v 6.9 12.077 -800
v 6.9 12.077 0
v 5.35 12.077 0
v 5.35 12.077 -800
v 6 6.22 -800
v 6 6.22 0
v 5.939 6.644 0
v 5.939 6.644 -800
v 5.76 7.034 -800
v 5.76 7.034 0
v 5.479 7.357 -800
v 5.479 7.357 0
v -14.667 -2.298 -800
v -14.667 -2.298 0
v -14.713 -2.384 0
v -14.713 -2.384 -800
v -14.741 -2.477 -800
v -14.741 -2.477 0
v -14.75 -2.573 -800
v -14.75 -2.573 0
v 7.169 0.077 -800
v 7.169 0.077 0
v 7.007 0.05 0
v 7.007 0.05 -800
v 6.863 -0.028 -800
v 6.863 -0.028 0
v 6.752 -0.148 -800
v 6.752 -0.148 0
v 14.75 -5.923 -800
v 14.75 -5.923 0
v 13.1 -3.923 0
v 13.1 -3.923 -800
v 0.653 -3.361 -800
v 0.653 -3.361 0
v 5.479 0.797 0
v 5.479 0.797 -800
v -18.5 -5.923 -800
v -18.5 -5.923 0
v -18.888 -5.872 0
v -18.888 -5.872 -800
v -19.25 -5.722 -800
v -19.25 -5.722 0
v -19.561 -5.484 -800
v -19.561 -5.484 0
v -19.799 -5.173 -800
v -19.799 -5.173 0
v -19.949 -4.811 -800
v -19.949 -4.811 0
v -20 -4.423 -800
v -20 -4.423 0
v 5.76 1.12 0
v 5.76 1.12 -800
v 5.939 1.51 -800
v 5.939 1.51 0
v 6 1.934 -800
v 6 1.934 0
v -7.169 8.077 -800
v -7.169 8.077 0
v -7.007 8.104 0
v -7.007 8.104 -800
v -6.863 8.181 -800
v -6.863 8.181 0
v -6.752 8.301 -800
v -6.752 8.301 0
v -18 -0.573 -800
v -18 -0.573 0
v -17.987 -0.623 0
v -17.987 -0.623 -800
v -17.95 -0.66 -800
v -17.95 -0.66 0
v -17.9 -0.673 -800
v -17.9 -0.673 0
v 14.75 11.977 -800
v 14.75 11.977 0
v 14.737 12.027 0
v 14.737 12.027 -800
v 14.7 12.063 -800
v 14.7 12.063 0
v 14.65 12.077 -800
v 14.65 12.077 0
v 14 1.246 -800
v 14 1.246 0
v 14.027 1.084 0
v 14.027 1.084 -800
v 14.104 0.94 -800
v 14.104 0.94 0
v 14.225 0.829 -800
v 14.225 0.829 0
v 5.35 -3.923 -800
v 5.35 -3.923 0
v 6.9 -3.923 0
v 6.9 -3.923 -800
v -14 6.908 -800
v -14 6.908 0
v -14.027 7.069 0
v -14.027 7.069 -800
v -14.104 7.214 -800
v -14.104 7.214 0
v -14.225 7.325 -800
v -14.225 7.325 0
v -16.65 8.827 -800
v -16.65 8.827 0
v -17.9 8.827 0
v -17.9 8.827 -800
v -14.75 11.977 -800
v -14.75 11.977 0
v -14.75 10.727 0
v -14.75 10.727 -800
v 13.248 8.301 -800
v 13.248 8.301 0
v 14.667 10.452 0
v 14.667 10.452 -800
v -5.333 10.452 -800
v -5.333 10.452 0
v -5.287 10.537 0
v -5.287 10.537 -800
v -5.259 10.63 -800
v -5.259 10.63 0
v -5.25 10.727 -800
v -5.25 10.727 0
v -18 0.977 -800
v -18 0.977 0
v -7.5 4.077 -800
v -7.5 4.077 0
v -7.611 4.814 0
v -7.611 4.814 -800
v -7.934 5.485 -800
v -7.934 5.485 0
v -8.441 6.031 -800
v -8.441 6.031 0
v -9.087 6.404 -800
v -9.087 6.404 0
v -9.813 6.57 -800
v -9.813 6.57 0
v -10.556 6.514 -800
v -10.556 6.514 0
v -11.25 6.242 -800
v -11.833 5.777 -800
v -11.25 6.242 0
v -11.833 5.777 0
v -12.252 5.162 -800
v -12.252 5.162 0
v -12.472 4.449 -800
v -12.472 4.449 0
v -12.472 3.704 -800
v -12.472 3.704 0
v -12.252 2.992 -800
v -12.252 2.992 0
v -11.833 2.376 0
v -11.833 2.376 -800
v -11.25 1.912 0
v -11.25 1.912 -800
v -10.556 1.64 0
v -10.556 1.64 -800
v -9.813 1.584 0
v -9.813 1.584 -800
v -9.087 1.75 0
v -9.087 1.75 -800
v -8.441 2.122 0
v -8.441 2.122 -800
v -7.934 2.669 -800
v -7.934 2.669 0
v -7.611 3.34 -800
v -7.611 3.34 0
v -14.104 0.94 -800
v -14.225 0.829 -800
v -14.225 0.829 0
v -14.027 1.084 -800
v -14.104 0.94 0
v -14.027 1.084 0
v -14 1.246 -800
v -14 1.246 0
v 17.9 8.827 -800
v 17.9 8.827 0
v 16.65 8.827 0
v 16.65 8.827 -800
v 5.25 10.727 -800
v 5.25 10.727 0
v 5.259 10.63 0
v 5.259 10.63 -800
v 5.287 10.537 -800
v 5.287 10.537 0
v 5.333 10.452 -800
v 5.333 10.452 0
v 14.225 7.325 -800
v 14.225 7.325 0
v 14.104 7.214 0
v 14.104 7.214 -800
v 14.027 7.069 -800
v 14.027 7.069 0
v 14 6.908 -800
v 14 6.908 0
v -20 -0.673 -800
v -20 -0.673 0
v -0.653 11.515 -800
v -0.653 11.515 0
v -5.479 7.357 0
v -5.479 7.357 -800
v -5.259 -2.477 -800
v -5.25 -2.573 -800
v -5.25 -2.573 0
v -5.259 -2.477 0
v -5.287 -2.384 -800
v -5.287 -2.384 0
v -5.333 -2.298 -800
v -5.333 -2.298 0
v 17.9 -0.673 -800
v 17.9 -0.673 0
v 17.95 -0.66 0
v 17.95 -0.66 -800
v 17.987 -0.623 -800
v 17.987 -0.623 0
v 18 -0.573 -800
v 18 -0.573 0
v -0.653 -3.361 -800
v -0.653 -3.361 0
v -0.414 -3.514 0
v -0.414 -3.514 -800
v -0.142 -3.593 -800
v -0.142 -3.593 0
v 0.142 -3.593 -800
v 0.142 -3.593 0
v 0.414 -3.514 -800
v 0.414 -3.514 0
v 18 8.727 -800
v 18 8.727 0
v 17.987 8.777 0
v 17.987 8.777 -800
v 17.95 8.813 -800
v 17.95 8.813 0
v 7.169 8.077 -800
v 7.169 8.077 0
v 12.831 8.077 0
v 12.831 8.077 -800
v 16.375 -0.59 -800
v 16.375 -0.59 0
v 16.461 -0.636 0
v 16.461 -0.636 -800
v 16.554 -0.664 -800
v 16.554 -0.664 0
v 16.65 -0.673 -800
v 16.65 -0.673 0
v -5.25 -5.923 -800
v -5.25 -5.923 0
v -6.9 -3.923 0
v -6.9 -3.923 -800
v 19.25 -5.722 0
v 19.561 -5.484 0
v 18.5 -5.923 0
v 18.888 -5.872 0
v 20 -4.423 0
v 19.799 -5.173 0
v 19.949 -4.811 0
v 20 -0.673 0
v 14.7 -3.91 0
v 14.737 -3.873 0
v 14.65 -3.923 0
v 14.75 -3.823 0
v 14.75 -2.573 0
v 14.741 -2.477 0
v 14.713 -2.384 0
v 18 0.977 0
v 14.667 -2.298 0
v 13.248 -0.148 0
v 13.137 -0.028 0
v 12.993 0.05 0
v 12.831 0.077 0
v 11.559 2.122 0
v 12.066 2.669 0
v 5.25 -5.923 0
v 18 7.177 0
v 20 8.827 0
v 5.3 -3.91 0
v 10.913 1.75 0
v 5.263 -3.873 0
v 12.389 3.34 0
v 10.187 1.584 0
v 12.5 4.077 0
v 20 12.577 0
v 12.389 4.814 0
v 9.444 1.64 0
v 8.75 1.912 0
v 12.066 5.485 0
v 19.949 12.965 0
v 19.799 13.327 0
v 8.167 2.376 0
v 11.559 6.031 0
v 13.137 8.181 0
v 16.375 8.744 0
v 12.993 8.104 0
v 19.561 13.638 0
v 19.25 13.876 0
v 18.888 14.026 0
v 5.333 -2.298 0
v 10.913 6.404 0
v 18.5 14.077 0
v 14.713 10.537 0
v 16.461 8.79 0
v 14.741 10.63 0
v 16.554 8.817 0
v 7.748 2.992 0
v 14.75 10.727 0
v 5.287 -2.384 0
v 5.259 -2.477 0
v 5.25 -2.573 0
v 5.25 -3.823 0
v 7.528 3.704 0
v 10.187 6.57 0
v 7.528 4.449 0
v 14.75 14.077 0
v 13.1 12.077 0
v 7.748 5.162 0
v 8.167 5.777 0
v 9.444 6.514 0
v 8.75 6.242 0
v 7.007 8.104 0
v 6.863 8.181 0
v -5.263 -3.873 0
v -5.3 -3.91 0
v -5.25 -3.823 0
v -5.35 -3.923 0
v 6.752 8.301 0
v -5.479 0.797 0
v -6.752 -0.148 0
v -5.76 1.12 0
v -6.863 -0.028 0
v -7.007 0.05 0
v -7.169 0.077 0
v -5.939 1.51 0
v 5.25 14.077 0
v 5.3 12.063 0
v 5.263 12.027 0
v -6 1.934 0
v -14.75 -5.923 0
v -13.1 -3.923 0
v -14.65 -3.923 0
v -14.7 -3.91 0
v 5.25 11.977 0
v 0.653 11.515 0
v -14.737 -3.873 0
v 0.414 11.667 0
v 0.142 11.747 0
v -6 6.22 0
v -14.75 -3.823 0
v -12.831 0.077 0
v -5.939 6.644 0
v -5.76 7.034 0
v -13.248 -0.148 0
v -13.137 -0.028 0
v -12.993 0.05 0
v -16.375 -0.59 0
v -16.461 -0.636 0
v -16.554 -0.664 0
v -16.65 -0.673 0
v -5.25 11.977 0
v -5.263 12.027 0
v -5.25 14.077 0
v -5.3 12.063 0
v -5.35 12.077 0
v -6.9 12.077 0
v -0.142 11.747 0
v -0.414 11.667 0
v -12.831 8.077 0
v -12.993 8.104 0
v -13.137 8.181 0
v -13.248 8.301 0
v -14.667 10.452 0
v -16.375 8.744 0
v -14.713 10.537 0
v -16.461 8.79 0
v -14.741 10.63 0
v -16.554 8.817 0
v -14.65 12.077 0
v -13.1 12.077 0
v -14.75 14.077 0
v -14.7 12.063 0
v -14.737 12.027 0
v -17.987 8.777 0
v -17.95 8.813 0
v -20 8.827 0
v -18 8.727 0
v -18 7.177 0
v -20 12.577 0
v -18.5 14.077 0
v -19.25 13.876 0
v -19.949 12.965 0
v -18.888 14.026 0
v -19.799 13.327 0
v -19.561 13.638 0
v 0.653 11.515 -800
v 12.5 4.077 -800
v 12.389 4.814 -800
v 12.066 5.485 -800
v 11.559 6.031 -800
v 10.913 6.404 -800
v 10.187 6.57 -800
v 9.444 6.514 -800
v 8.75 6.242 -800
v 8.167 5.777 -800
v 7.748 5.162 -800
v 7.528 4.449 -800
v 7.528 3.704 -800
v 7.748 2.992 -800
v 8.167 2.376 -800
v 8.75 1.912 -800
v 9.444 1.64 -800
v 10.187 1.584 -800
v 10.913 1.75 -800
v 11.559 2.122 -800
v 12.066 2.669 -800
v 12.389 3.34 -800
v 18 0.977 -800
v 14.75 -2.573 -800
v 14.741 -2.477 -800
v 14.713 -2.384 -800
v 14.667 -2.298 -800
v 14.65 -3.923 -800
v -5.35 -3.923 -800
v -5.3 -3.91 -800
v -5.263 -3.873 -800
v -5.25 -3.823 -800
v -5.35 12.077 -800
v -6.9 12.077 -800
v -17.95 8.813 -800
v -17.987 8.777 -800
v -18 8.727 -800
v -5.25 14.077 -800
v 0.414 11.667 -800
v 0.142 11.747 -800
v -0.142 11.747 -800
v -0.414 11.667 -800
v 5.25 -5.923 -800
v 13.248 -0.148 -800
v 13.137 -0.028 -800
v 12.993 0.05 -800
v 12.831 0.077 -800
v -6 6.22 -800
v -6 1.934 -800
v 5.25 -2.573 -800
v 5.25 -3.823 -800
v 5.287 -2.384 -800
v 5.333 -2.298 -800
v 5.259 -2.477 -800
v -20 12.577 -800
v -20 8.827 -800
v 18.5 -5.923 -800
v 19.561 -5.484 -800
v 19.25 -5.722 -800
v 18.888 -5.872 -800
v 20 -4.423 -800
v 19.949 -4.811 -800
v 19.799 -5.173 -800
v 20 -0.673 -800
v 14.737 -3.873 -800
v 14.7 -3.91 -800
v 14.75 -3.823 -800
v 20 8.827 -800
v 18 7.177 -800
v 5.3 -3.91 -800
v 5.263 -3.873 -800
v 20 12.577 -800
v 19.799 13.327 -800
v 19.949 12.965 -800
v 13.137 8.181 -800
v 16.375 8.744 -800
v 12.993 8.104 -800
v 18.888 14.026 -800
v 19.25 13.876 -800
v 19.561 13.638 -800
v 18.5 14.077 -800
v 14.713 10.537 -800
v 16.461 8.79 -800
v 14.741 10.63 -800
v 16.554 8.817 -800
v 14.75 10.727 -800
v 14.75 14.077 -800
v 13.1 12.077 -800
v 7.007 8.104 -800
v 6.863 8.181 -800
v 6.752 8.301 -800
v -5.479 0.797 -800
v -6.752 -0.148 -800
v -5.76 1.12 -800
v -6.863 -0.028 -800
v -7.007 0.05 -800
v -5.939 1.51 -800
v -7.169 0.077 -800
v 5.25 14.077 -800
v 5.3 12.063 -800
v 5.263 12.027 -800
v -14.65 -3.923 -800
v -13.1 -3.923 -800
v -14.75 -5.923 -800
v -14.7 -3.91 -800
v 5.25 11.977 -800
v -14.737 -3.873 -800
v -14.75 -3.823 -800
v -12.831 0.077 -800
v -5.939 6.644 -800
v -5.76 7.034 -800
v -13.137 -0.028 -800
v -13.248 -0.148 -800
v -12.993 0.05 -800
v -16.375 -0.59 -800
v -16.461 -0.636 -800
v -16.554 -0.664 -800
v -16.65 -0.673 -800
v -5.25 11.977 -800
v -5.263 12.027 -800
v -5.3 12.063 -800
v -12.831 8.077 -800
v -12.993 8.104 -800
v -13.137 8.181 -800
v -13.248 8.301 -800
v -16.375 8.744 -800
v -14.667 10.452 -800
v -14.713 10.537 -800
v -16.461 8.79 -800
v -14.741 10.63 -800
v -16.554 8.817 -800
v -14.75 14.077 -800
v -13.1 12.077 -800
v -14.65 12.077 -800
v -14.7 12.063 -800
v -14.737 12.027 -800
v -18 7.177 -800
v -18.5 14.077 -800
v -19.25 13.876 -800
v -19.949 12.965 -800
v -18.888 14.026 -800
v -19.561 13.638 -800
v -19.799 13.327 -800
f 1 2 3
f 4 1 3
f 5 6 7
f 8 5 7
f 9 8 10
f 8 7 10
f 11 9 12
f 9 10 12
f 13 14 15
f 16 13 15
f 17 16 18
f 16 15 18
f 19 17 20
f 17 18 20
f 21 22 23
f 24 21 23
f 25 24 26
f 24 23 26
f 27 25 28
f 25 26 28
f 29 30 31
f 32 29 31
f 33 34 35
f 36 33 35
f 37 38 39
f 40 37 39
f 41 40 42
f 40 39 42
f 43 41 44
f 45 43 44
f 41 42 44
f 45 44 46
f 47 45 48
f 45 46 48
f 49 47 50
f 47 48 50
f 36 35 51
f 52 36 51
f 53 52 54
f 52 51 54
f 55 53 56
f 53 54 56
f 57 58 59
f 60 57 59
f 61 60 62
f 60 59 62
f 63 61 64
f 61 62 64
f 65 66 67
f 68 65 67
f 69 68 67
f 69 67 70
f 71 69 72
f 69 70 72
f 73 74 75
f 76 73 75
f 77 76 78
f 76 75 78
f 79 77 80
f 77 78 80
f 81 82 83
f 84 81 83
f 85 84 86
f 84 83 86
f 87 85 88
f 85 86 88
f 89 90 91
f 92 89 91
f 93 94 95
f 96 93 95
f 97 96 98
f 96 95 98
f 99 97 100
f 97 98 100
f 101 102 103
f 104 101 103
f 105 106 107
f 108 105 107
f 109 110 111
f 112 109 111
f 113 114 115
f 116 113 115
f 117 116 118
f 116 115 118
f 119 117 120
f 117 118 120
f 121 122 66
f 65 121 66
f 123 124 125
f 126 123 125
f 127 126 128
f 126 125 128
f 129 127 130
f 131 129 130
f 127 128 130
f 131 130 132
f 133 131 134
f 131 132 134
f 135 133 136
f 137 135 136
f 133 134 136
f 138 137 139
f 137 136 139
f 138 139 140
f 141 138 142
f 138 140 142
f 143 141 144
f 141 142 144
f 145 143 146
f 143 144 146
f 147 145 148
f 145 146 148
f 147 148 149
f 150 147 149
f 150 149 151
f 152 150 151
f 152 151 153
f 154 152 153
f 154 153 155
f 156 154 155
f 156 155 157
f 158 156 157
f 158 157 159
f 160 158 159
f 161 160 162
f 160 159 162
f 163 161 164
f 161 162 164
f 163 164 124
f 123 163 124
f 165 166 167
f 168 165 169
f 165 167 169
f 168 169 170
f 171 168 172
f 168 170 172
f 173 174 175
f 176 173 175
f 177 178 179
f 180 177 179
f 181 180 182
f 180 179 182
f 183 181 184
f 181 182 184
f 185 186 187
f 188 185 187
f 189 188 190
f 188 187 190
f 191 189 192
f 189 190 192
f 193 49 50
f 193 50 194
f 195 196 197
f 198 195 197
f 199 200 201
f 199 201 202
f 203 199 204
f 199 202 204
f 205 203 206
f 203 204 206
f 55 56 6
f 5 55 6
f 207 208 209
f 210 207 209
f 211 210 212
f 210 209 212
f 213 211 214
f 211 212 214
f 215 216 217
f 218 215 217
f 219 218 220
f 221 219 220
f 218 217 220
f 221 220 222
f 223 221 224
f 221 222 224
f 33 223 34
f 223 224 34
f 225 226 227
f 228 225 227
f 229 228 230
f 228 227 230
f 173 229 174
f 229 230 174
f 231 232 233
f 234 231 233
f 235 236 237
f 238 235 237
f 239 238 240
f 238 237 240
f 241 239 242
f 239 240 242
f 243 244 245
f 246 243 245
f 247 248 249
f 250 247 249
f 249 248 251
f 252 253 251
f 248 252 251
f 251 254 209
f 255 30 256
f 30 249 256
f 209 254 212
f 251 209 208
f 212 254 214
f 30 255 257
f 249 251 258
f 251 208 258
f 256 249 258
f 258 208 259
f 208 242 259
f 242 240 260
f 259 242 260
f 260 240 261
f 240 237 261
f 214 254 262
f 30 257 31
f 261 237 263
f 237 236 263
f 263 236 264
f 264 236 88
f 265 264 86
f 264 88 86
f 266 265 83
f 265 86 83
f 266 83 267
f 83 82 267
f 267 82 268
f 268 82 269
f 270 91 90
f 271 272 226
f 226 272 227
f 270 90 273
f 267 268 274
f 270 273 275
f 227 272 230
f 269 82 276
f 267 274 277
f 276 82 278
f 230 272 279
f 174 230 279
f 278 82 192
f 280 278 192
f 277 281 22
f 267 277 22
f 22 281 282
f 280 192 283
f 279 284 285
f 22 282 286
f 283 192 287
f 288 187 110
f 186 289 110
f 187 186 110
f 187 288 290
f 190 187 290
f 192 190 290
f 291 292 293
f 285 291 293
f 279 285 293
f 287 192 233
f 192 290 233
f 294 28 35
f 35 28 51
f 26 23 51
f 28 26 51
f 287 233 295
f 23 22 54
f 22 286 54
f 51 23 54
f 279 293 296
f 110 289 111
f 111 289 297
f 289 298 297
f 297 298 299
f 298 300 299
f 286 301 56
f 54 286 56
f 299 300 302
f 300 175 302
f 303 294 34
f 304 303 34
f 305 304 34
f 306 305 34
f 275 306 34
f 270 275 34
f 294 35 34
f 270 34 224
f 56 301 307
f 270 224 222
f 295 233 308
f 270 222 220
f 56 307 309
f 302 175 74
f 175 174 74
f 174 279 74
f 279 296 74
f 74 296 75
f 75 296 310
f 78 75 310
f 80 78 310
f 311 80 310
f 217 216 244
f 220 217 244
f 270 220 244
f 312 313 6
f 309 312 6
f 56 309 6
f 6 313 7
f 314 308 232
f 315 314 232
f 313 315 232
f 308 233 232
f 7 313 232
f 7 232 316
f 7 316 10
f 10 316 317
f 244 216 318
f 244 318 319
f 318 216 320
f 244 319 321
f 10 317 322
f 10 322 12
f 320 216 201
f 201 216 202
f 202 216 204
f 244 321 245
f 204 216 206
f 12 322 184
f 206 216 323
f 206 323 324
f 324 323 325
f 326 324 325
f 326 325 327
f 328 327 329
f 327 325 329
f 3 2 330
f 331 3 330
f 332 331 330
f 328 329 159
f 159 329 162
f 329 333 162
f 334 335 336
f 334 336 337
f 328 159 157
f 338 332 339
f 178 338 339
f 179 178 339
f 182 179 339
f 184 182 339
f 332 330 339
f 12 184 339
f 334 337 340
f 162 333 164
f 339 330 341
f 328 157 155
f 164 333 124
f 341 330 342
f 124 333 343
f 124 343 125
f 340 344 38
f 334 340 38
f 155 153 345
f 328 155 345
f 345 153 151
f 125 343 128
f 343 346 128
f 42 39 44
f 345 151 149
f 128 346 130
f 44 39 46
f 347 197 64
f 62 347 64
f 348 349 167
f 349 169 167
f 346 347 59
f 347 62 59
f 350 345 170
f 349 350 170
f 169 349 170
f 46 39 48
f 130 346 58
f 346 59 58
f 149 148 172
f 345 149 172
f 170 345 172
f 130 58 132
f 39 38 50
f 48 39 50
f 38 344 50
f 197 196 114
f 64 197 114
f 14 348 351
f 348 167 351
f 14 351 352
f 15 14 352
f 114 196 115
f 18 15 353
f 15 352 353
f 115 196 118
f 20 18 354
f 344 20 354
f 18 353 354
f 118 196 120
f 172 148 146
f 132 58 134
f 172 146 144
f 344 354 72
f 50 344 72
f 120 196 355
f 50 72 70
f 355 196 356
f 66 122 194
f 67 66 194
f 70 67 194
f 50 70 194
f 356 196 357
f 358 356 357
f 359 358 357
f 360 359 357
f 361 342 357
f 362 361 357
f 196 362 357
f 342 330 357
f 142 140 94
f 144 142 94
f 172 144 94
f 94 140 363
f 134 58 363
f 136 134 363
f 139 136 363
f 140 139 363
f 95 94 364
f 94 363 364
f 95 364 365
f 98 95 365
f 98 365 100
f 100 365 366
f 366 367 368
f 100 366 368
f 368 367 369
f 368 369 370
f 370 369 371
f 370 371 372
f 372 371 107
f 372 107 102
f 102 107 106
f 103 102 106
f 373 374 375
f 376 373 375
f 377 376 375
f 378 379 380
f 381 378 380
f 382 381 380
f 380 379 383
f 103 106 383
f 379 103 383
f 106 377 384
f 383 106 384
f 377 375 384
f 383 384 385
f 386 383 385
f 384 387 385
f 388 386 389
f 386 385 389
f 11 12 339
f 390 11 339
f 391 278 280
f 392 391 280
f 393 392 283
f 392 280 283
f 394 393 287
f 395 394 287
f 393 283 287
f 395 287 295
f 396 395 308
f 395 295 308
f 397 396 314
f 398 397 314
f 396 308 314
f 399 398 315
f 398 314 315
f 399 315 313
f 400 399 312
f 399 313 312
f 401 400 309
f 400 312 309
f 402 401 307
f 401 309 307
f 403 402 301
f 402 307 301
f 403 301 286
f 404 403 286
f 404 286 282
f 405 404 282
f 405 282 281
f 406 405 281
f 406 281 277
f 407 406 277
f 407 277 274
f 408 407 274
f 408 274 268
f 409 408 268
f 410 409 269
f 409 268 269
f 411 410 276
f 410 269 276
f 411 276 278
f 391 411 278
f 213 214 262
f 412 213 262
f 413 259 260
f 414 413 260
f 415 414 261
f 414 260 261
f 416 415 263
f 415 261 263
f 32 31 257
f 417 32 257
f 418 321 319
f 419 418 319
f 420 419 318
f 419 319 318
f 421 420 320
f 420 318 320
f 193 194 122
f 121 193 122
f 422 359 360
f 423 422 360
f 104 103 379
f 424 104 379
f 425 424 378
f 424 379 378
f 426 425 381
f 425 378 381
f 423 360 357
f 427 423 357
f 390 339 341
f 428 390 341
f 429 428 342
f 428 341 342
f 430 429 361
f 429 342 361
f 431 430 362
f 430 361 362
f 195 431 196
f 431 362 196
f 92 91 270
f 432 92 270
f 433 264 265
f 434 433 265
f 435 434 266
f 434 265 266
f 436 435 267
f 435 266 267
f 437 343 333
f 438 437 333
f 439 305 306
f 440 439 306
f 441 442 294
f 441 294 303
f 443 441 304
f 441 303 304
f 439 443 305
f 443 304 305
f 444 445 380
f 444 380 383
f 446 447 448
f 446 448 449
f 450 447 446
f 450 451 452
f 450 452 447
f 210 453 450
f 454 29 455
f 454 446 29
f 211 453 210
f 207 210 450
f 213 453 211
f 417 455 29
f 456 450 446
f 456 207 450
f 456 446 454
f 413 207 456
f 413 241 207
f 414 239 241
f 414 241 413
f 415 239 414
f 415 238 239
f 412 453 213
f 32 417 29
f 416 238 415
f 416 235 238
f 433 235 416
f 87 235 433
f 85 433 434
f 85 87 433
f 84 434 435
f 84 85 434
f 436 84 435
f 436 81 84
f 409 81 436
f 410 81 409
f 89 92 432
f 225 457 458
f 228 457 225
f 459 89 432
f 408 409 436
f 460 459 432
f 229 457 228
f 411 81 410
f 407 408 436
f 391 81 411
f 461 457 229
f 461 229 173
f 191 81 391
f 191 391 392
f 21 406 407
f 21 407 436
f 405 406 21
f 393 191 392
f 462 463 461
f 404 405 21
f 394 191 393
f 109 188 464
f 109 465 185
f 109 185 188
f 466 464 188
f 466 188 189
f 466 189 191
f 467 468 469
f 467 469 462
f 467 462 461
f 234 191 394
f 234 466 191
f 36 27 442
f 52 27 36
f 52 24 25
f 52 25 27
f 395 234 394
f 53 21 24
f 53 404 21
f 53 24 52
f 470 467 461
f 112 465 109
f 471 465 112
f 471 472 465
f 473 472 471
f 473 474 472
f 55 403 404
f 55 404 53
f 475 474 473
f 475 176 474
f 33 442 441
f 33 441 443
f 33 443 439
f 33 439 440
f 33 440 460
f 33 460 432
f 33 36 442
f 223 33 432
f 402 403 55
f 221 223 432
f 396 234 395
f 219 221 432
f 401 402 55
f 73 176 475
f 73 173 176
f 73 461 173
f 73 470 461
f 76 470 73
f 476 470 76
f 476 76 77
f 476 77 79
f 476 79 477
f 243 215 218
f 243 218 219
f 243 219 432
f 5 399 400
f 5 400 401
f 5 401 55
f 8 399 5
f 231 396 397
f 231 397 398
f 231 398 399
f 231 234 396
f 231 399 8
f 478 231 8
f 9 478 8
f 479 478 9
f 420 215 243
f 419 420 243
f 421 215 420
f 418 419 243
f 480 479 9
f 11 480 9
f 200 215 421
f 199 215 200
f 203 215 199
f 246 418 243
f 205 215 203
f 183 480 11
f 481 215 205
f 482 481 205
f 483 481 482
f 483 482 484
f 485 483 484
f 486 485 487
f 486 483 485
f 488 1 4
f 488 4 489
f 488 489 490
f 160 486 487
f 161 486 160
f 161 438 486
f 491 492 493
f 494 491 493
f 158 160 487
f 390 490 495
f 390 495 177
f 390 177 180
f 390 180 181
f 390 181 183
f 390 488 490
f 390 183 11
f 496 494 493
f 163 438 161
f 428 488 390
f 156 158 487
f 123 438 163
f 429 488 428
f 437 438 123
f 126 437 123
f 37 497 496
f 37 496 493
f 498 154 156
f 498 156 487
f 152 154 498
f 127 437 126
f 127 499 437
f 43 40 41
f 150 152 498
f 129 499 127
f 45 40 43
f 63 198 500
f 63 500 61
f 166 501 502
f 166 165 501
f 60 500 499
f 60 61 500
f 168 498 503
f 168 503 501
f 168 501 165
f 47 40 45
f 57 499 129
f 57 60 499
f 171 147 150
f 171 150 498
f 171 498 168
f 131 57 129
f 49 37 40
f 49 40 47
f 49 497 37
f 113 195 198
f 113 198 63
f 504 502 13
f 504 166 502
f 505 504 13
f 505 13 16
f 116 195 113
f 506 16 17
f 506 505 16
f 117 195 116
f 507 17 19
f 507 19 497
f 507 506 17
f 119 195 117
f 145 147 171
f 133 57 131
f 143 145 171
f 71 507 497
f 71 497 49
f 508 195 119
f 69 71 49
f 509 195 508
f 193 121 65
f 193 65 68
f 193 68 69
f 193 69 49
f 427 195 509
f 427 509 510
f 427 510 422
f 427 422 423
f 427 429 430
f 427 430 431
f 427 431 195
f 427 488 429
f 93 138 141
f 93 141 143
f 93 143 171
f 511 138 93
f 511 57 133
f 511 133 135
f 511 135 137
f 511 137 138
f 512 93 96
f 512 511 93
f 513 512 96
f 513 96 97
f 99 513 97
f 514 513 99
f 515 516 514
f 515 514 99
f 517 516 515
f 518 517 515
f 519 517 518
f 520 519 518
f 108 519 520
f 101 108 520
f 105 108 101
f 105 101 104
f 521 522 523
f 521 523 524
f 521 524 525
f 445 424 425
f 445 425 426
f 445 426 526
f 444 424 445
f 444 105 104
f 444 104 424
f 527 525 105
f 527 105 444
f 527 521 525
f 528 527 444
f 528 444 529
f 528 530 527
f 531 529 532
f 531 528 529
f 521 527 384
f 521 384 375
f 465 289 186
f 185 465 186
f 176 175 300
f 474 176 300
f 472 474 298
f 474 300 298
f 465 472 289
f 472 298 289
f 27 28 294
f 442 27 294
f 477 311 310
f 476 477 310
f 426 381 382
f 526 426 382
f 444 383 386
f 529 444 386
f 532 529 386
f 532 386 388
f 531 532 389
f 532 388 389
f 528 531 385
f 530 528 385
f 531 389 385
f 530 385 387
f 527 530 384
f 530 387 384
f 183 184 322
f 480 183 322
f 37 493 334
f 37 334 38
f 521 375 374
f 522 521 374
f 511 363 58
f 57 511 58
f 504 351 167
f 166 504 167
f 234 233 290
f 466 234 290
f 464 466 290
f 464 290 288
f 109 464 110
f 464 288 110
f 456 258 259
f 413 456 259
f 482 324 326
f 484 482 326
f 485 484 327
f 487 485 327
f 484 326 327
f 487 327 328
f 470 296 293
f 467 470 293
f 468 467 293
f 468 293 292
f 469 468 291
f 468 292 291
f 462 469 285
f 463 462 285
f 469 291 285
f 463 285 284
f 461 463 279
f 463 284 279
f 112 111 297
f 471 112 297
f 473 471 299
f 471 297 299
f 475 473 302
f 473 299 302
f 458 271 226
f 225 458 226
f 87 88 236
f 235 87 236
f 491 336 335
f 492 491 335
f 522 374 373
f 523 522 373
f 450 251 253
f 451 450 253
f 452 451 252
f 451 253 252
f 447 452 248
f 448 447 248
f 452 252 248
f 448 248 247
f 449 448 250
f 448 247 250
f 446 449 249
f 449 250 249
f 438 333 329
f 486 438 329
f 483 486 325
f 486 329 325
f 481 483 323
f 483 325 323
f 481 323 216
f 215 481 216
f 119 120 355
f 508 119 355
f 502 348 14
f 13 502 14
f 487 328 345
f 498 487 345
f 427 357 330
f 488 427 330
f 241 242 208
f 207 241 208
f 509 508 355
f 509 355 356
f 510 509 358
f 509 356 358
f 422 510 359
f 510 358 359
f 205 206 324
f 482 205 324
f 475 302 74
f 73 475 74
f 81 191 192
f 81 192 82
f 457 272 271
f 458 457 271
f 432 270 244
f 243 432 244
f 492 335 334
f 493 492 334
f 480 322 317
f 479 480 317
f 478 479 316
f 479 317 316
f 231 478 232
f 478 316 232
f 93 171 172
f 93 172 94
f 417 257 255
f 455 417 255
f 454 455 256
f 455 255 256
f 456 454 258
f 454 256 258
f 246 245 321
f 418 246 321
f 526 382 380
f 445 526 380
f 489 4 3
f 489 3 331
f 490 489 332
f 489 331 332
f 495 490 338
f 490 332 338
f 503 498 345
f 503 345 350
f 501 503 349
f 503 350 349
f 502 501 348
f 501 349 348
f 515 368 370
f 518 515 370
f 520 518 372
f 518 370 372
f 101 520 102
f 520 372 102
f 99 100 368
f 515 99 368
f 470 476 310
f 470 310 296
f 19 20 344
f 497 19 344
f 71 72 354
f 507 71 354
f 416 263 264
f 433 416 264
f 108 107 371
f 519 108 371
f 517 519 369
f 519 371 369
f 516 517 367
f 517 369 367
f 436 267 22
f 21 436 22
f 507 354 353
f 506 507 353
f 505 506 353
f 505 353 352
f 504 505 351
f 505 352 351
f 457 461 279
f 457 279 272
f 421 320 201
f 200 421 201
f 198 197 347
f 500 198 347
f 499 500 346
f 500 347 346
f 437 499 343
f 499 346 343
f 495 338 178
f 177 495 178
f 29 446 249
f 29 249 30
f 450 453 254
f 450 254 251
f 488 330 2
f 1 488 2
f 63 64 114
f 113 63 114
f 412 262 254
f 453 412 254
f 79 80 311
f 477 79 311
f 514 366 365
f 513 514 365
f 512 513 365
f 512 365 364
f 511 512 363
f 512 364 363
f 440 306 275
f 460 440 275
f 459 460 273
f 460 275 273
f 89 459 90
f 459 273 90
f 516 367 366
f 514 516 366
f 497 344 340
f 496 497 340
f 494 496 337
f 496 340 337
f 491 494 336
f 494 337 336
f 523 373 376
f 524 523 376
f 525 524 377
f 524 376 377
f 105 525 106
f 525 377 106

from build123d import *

# Parameters (mm, degrees)
SKETCH_1_R      = 2.5
EXTRUDE_1_DEPTH = 800


with BuildPart() as part:
    # Эскиз1 → Бобышка-Вытянуть1 (new body)
    with BuildSketch(Plane.XY):
        with BuildLine():
            Line((-18.5, 14.076873633), (-14.75, 14.076873633))
            Line((-14.75, 14.076873633), (-13.1, 12.076873633))
            Line((-13.1, 12.076873633), (-14.65, 12.076873633))
            ThreePointArc((-14.65, 12.076873633), (-14.720710678, 12.047584311), (-14.75, 11.976873633))
            Line((-14.75, 11.976873633), (-14.75, 10.726998833))
            ThreePointArc((-14.75, 10.726998833), (-14.728880127, 10.583214884), (-14.667304703, 10.451577729))
            Line((-14.667304703, 10.451577729), (-13.248222071, 8.301452529))
            ThreePointArc((-13.248222071, 8.301452529), (-13.067866147, 8.136583642), (-12.830917368, 8.076873633))
            Line((-12.830917368, 8.076873633), (-7.169082632, 8.076873633))
            ThreePointArc((-7.169082632, 8.076873633), (-6.932133853, 8.136583642), (-6.751777929, 8.301452529))
            Line((-6.751777929, 8.301452529), (-5.332695297, 10.451577729))
            ThreePointArc((-5.332695297, 10.451577729), (-5.271119873, 10.583214884), (-5.25, 10.726998833))
            Line((-5.25, 10.726998833), (-5.25, 11.976873633))
            ThreePointArc((-5.25, 11.976873633), (-5.279289322, 12.047584311), (-5.35, 12.076873633))
            Line((-5.35, 12.076873633), (-6.9, 12.076873633))
            Line((-6.9, 12.076873633), (-5.25, 14.076873633))
            Line((-5.25, 14.076873633), (5.25, 14.076873633))
            Line((5.25, 14.076873633), (6.9, 12.076873633))
            Line((6.9, 12.076873633), (5.35, 12.076873633))
            ThreePointArc((5.35, 12.076873633), (5.279289322, 12.047584311), (5.25, 11.976873633))
            Line((5.25, 11.976873633), (5.25, 10.726998833))
            ThreePointArc((5.25, 10.726998833), (5.271119873, 10.583214884), (5.332695297, 10.451577729))
            Line((5.332695297, 10.451577729), (6.751777929, 8.301452529))
            ThreePointArc((6.751777929, 8.301452529), (6.932133853, 8.136583642), (7.169082632, 8.076873633))
            Line((7.169082632, 8.076873633), (12.830917368, 8.076873633))
            ThreePointArc((12.830917368, 8.076873633), (13.067866147, 8.136583642), (13.248222071, 8.301452529))
            Line((13.248222071, 8.301452529), (14.667304703, 10.451577729))
            ThreePointArc((14.667304703, 10.451577729), (14.728880127, 10.583214884), (14.75, 10.726998833))
            Line((14.75, 10.726998833), (14.75, 11.976873633))
            ThreePointArc((14.75, 11.976873633), (14.720710678, 12.047584311), (14.65, 12.076873633))
            Line((14.65, 12.076873633), (13.1, 12.076873633))
            Line((13.1, 12.076873633), (14.75, 14.076873633))
            Line((14.75, 14.076873633), (18.5, 14.076873633))
            ThreePointArc((18.5, 14.076873633), (19.560660172, 13.637533805), (20, 12.576873633))
            Line((20, 12.576873633), (20, 8.826873633))
            Line((20, 8.826873633), (18, 7.176873633))
            Line((18, 7.176873633), (18, 8.726873633))
            ThreePointArc((18, 8.726873633), (17.970710678, 8.797584311), (17.9, 8.826873633))
            Line((17.9, 8.826873633), (16.6501252, 8.826873633))
            ThreePointArc((16.6501252, 8.826873633), (16.50634125, 8.80575376), (16.374704096, 8.744178337))
            Line((16.374704096, 8.744178337), (14.224578896, 7.325095704))
            ThreePointArc((14.224578896, 7.325095704), (14.059710009, 7.14473978), (14, 6.907791001))
            Line((14, 6.907791001), (14, 1.245956265))
            ThreePointArc((14, 1.245956265), (14.059710009, 1.009007486), (14.224578896, 0.828651562))
            Line((14.224578896, 0.828651562), (16.374704096, -0.59043107))
            ThreePointArc((16.374704096, -0.59043107), (16.50634125, -0.652006494), (16.6501252, -0.673126367))
            Line((16.6501252, -0.673126367), (17.9, -0.673126367))
            ThreePointArc((17.9, -0.673126367), (17.970710678, -0.643837045), (18, -0.573126367))
            Line((18, -0.573126367), (18, 0.976873633))
            Line((18, 0.976873633), (20, -0.673126367))
            Line((20, -0.673126367), (20, -4.423126367))
            ThreePointArc((20, -4.423126367), (19.560660172, -5.483786539), (18.5, -5.923126367))
            Line((18.5, -5.923126367), (14.75, -5.923126367))
            Line((14.75, -5.923126367), (13.1, -3.923126367))
            Line((13.1, -3.923126367), (14.65, -3.923126367))
            ThreePointArc((14.65, -3.923126367), (14.720710678, -3.893837045), (14.75, -3.823126367))
            Line((14.75, -3.823126367), (14.75, -2.573251567))
            ThreePointArc((14.75, -2.573251567), (14.728880127, -2.429467617), (14.667304703, -2.297830463))
            Line((14.667304703, -2.297830463), (13.248222071, -0.147705263))
            ThreePointArc((13.248222071, -0.147705263), (13.067866147, 0.017163624), (12.830917368, 0.076873633))
            Line((12.830917368, 0.076873633), (7.169082632, 0.076873633))
            ThreePointArc((7.169082632, 0.076873633), (6.932133853, 0.017163624), (6.751777929, -0.147705263))
            Line((6.751777929, -0.147705263), (5.332695297, -2.297830463))
            ThreePointArc((5.332695297, -2.297830463), (5.271119873, -2.429467617), (5.25, -2.573251567))
            Line((5.25, -2.573251567), (5.25, -3.823126367))
            ThreePointArc((5.25, -3.823126367), (5.279289322, -3.893837045), (5.35, -3.923126367))
            Line((5.35, -3.923126367), (6.9, -3.923126367))
            Line((6.9, -3.923126367), (5.25, -5.923126367))
            Line((5.25, -5.923126367), (-5.25, -5.923126367))
            Line((-5.25, -5.923126367), (-6.9, -3.923126367))
            Line((-6.9, -3.923126367), (-5.35, -3.923126367))
            ThreePointArc((-5.35, -3.923126367), (-5.279289322, -3.893837045), (-5.25, -3.823126367))
            Line((-5.25, -3.823126367), (-5.25, -2.573251567))
            ThreePointArc((-5.25, -2.573251567), (-5.271119873, -2.429467617), (-5.332695297, -2.297830463))
            Line((-5.332695297, -2.297830463), (-6.751777929, -0.147705263))
            ThreePointArc((-6.751777929, -0.147705263), (-6.932133853, 0.017163624), (-7.169082632, 0.076873633))
            Line((-7.169082632, 0.076873633), (-12.830917368, 0.076873633))
            ThreePointArc((-12.830917368, 0.076873633), (-13.067866147, 0.017163624), (-13.248222071, -0.147705263))
            Line((-13.248222071, -0.147705263), (-14.667304703, -2.297830463))
            ThreePointArc((-14.667304703, -2.297830463), (-14.728880127, -2.429467617), (-14.75, -2.573251567))
            Line((-14.75, -2.573251567), (-14.75, -3.823126367))
            ThreePointArc((-14.75, -3.823126367), (-14.720710678, -3.893837045), (-14.65, -3.923126367))
            Line((-14.65, -3.923126367), (-13.1, -3.923126367))
            Line((-13.1, -3.923126367), (-14.75, -5.923126367))
            Line((-14.75, -5.923126367), (-18.5, -5.923126367))
            ThreePointArc((-18.5, -5.923126367), (-19.560660172, -5.483786539), (-20, -4.423126367))
            Line((-20, -4.423126367), (-20, -0.673126367))
            Line((-20, -0.673126367), (-18, 0.976873633))
            Line((-18, 0.976873633), (-18, -0.573126367))
            ThreePointArc((-18, -0.573126367), (-17.970710678, -0.643837045), (-17.9, -0.673126367))
            Line((-17.9, -0.673126367), (-16.6501252, -0.673126367))
            ThreePointArc((-16.6501252, -0.673126367), (-16.50634125, -0.652006494), (-16.374704096, -0.59043107))
            Line((-16.374704096, -0.59043107), (-14.224578896, 0.828651562))
            ThreePointArc((-14.224578896, 0.828651562), (-14.059710009, 1.009007486), (-14, 1.245956265))
            Line((-14, 1.245956265), (-14, 6.907791001))
            ThreePointArc((-14, 6.907791001), (-14.059710009, 7.14473978), (-14.224578896, 7.325095704))
            Line((-14.224578896, 7.325095704), (-16.374704096, 8.744178337))
            ThreePointArc((-16.374704096, 8.744178337), (-16.50634125, 8.80575376), (-16.6501252, 8.826873633))
            Line((-16.6501252, 8.826873633), (-17.9, 8.826873633))
            ThreePointArc((-17.9, 8.826873633), (-17.970710678, 8.797584311), (-18, 8.726873633))
            Line((-18, 8.726873633), (-18, 7.176873633))
            Line((-18, 7.176873633), (-20, 8.826873633))
            Line((-20, 8.826873633), (-20, 12.576873633))
            ThreePointArc((-20, 12.576873633), (-19.560660172, 13.637533805), (-18.5, 14.076873633))
        make_face()
        with Locations((-10, 4.076873633)):
            Circle(SKETCH_1_R, mode=Mode.SUBTRACT)
        with Locations((10, 4.076873633)):
            Circle(SKETCH_1_R, mode=Mode.SUBTRACT)
        with BuildLine():
            Line((-6, 6.220171901), (-6, 1.933575365))
            ThreePointArc((-6, 1.933575365), (-5.863556224, 1.30850383), (-5.479047434, 0.797148455))
            Line((-5.479047434, 0.797148455), (-0.652698289, -3.360817802))
            ThreePointArc((-0.652698289, -3.360817802), (0, -3.603199861), (0.652698289, -3.360817802))
            Line((0.652698289, -3.360817802), (5.479047434, 0.797148455))
            ThreePointArc((5.479047434, 0.797148455), (5.863556224, 1.30850383), (6, 1.933575365))
            Line((6, 1.933575365), (6, 6.220171901))
            ThreePointArc((6, 6.220171901), (5.863556224, 6.845243437), (5.479047434, 7.356598811))
            Line((5.479047434, 7.356598811), (0.652698289, 11.514565068))
            ThreePointArc((0.652698289, 11.514565068), (0, 11.756947128), (-0.652698289, 11.514565068))
            Line((-0.652698289, 11.514565068), (-5.479047434, 7.356598811))
            ThreePointArc((-5.479047434, 7.356598811), (-5.863556224, 6.845243437), (-6, 6.220171901))
        make_face(mode=Mode.SUBTRACT)
    extrude(amount=-EXTRUDE_1_DEPTH)


solid = part.part
